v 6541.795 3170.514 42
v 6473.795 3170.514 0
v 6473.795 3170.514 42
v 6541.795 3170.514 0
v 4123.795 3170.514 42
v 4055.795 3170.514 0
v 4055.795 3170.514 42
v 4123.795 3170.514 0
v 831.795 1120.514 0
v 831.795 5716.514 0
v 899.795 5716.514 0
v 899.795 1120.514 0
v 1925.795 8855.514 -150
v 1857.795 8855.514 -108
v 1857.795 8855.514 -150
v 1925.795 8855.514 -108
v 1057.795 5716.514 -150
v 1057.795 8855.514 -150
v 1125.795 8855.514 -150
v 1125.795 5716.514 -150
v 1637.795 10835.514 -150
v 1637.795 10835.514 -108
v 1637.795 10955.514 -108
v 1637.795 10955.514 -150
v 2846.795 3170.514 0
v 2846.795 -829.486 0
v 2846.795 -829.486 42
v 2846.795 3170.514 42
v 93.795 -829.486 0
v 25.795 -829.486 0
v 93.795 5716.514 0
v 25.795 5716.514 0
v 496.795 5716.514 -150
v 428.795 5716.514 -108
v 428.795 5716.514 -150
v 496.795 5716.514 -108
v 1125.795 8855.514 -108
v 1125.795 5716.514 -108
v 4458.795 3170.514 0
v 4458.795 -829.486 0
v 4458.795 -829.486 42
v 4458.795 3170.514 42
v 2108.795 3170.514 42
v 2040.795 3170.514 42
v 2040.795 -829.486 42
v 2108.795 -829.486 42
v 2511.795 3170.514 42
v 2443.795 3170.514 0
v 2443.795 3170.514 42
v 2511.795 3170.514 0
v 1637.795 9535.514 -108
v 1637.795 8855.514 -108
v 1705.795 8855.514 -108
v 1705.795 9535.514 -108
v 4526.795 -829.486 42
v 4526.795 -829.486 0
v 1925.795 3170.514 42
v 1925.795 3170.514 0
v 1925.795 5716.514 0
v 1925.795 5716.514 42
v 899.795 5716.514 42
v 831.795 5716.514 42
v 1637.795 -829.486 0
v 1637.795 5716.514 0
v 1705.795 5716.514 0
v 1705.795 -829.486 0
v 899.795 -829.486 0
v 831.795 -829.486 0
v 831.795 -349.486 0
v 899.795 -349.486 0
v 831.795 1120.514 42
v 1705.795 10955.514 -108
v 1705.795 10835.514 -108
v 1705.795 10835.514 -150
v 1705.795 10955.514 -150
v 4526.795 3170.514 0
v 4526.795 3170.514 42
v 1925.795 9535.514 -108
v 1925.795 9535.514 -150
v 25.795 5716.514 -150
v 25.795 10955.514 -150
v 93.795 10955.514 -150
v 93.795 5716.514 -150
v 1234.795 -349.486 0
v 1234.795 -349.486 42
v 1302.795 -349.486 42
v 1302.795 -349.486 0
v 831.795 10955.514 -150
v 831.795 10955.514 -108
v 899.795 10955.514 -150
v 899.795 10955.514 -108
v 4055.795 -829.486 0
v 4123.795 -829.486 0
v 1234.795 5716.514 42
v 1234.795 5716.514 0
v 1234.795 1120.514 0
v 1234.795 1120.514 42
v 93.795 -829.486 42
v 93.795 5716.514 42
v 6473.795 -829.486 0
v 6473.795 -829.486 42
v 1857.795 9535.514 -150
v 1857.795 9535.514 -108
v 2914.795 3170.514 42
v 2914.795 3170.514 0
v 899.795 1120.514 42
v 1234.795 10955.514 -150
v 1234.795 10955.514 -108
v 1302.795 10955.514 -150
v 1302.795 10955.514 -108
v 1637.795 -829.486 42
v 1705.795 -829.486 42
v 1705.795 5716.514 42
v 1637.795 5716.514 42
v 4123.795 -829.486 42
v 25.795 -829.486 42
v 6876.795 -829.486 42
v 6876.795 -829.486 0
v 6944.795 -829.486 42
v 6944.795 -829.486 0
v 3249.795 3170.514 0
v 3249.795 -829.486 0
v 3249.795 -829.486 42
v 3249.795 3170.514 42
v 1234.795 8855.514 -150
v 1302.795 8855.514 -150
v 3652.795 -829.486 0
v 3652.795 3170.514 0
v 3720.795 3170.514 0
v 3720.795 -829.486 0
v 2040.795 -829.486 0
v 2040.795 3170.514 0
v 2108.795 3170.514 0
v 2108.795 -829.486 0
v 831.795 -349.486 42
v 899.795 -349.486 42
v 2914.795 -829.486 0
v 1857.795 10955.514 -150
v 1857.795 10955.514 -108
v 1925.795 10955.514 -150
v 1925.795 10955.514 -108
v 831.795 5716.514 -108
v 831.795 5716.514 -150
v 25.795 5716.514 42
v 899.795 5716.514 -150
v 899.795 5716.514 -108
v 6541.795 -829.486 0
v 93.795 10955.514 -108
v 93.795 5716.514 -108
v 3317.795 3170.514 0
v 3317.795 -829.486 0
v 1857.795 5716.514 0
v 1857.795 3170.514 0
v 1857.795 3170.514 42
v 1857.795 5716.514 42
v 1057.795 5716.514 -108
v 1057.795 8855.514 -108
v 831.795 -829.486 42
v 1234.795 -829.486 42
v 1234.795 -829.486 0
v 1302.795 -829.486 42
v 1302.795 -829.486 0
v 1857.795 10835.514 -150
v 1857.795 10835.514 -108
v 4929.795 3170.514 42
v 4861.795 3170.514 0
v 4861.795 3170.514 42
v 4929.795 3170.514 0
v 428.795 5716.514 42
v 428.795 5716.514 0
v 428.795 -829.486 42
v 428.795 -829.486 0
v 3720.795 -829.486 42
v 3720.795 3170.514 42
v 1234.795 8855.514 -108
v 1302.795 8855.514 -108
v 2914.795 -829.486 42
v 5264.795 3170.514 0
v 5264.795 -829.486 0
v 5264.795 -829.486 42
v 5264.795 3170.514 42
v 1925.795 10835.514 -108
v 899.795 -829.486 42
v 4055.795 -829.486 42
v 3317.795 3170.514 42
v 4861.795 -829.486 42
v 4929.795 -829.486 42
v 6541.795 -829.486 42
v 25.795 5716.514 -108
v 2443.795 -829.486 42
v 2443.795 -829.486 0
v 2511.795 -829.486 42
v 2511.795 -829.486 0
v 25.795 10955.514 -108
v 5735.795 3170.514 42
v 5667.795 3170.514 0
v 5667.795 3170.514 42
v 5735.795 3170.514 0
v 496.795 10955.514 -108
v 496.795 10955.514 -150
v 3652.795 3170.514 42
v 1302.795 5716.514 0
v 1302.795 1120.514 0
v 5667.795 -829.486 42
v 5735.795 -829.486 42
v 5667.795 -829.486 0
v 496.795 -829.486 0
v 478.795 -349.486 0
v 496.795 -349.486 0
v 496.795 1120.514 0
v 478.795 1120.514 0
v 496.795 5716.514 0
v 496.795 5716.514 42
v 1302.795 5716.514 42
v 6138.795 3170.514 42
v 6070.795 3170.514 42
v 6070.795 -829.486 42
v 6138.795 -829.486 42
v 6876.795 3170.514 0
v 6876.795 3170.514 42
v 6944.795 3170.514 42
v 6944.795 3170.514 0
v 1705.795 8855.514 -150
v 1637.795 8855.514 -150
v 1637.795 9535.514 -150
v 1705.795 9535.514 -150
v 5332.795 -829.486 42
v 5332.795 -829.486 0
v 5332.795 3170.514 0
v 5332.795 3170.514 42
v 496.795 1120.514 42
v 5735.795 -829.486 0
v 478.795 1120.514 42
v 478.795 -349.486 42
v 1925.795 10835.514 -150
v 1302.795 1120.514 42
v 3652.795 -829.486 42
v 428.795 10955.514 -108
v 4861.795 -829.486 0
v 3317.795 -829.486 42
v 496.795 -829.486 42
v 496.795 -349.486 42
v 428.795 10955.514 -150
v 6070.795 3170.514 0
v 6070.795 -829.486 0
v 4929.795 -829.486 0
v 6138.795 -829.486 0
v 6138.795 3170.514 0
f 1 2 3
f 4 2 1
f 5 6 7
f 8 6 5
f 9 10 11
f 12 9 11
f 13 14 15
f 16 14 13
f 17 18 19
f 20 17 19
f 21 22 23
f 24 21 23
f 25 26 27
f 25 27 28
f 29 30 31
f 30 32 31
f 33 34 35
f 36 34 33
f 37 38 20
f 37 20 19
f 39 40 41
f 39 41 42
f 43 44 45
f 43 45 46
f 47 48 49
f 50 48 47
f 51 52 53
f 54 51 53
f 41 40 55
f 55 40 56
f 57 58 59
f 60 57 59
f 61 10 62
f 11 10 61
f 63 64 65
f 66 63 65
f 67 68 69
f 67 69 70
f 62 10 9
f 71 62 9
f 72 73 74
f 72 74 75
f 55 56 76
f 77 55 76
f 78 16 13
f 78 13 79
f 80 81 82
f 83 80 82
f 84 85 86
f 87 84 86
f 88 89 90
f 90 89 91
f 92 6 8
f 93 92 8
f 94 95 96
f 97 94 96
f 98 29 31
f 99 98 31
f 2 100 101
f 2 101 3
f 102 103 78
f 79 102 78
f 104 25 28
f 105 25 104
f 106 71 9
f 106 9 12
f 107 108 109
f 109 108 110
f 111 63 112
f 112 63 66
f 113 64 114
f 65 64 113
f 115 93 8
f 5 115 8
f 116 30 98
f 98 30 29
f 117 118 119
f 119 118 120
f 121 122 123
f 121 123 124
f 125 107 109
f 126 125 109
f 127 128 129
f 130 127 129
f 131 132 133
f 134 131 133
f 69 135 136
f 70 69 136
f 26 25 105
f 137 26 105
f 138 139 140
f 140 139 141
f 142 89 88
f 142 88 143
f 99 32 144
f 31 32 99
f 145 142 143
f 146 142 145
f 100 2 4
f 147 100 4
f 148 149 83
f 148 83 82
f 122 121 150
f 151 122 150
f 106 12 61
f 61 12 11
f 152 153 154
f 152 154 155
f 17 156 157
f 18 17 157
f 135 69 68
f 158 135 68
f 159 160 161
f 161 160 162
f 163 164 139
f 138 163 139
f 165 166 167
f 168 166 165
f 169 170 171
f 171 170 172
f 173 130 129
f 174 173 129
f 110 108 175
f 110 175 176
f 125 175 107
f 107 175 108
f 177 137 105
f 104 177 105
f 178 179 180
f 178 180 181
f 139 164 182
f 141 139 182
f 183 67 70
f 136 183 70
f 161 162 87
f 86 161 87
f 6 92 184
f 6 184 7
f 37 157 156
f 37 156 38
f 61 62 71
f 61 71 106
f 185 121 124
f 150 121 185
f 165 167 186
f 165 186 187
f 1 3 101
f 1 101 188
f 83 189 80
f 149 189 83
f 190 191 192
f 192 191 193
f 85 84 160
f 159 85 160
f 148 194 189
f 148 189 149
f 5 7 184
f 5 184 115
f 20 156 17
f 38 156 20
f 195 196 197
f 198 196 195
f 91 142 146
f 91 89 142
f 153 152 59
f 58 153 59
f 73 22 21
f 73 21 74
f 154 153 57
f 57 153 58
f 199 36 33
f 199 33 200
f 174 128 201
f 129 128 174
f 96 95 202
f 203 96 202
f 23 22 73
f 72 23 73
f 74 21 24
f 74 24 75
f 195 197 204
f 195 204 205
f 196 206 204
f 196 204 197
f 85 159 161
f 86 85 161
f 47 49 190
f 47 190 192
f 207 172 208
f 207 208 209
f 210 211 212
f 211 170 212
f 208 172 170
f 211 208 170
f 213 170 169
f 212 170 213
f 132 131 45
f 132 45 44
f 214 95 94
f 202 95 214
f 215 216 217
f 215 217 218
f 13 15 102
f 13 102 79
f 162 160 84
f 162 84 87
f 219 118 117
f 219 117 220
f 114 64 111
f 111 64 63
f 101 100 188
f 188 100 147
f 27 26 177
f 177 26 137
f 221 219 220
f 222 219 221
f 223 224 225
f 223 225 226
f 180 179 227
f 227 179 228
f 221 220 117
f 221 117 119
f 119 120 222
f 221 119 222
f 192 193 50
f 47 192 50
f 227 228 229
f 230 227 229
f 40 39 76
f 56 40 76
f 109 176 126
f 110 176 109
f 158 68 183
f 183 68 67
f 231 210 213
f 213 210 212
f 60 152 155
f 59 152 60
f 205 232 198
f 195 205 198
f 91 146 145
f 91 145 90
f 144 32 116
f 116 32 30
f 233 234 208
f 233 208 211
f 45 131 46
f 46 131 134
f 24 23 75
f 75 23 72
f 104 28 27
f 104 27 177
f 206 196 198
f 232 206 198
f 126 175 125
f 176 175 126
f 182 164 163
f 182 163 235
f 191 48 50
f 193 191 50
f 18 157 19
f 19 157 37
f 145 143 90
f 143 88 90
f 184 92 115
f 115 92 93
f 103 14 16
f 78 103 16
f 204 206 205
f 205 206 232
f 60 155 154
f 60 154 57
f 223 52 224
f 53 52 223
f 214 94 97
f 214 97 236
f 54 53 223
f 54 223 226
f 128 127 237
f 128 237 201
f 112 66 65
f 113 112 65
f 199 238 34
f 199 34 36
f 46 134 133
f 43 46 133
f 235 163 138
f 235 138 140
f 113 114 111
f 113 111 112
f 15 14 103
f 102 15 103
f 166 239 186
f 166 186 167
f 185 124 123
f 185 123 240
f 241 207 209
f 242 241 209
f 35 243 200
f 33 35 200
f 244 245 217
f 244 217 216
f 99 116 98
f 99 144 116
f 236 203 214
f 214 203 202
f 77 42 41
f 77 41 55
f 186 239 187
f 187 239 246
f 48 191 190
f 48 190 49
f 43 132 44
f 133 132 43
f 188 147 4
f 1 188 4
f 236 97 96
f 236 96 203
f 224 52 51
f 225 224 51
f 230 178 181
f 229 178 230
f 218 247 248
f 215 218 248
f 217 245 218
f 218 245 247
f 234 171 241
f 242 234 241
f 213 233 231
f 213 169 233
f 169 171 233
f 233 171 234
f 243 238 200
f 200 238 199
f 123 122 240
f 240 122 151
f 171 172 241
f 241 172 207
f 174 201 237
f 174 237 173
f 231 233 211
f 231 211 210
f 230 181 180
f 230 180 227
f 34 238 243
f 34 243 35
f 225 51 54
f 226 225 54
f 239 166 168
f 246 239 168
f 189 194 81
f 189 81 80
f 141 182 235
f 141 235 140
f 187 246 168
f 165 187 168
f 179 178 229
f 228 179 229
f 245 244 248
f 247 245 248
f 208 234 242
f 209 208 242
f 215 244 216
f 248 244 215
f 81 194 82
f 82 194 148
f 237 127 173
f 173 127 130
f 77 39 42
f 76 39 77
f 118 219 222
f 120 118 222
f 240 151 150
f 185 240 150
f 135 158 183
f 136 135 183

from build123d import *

# Parameters (mm, degrees)
F0_W     = 68
F0_H     = 4000
F0_H_2   = 2546
F1_DEPTH = 42
F2_START = -108
F0_H_3   = 2100
F2_DEPTH = 42
F0_H_4   = 3139
F3_W     = 600
F3_H     = 1300
F3_W_2   = 1000
F3_H_2   = 1470
F4_DEPTH = 1000


with BuildPart() as f1:
    # F0 (on Top) → F1 (new body)
    with BuildSketch(Plane.XY):
        with Locations((59.794658795, 1170.5140980401)):
            Rectangle(F0_W, F0_H)
        with Locations((59.794658795, 4443.5140980401)):
            Rectangle(F0_W, F0_H_2)
    extrude(amount=F1_DEPTH)


with BuildPart() as f1b:
    # F0 (on Top) → F1, piece 2 (new body)
    with BuildSketch(Plane.XY):
        with Locations((462.794658795, 1170.5140980401)):
            Rectangle(F0_W, F0_H)
        with Locations((462.794658795, 4443.5140980401)):
            Rectangle(F0_W, F0_H_2)
    extrude(amount=F1_DEPTH)


with BuildPart() as f1c:
    # F0 (on Top) → F1, piece 3 (new body)
    with BuildSketch(Plane.XY):
        with Locations((865.794658795, 1170.5140980401)):
            Rectangle(F0_W, F0_H)
        with Locations((865.794658795, 4443.5140980401)):
            Rectangle(F0_W, F0_H_2)
    extrude(amount=F1_DEPTH)


with BuildPart() as f1d:
    # F0 (on Top) → F1, piece 4 (new body)
    with BuildSketch(Plane.XY):
        with Locations((1268.794658795, 1170.5140980401)):
            Rectangle(F0_W, F0_H)
        with Locations((1268.794658795, 4443.5140980401)):
            Rectangle(F0_W, F0_H_2)
    extrude(amount=F1_DEPTH)


with BuildPart() as f1e:
    # F0 (on Top) → F1, piece 5 (new body)
    with BuildSketch(Plane.XY):
        with Locations((2477.794658795, 1170.5140980401)):
            Rectangle(F0_W, F0_H)
    extrude(amount=F1_DEPTH)


with BuildPart() as f1f:
    # F0 (on Top) → F1, piece 6 (new body)
    with BuildSketch(Plane.XY):
        with Locations((4089.794658795, 1170.5140980401)):
            Rectangle(F0_W, F0_H)
    extrude(amount=F1_DEPTH)


with BuildPart() as f1g:
    # F0 (on Top) → F1, piece 7 (new body)
    with BuildSketch(Plane.XY):
        with Locations((2880.794658795, 1170.5140980401)):
            Rectangle(F0_W, F0_H)
    extrude(amount=F1_DEPTH)


with BuildPart() as f1h:
    # F0 (on Top) → F1, piece 8 (new body)
    with BuildSketch(Plane.XY):
        with Locations((1671.794658795, 4443.5140980401)):
            Rectangle(F0_W, F0_H_2)
        with Locations((1671.794658795, 1170.5140980401)):
            Rectangle(F0_W, F0_H)
    extrude(amount=F1_DEPTH)


with BuildPart() as f1i:
    # F0 (on Top) → F1, piece 9 (new body)
    with BuildSketch(Plane.XY):
        with Locations((2074.794658795, 1170.5140980401)):
            Rectangle(F0_W, F0_H)
    extrude(amount=F1_DEPTH)


with BuildPart() as f1j:
    # F0 (on Top) → F1, piece 10 (new body)
    with BuildSketch(Plane.XY):
        with Locations((5298.794658795, 1170.5140980401)):
            Rectangle(F0_W, F0_H)
    extrude(amount=F1_DEPTH)


with BuildPart() as f1k:
    # F0 (on Top) → F1, piece 11 (new body)
    with BuildSketch(Plane.XY):
        with Locations((5701.794658795, 1170.5140980401)):
            Rectangle(F0_W, F0_H)
    extrude(amount=F1_DEPTH)


with BuildPart() as f1l:
    # F0 (on Top) → F1, piece 12 (new body)
    with BuildSketch(Plane.XY):
        with Locations((4492.794658795, 1170.5140980401)):
            Rectangle(F0_W, F0_H)
    extrude(amount=F1_DEPTH)


with BuildPart() as f1m:
    # F0 (on Top) → F1, piece 13 (new body)
    with BuildSketch(Plane.XY):
        with Locations((3283.794658795, 1170.5140980401)):
            Rectangle(F0_W, F0_H)
    extrude(amount=F1_DEPTH)


with BuildPart() as f1n:
    # F0 (on Top) → F1, piece 14 (new body)
    with BuildSketch(Plane.XY):
        with Locations((4895.794658795, 1170.5140980401)):
            Rectangle(F0_W, F0_H)
    extrude(amount=F1_DEPTH)


with BuildPart() as f1o:
    # F0 (on Top) → F1, piece 15 (new body)
    with BuildSketch(Plane.XY):
        with Locations((3686.794658795, 1170.5140980401)):
            Rectangle(F0_W, F0_H)
    extrude(amount=F1_DEPTH)


with BuildPart() as f1p:
    # F0 (on Top) → F1, piece 16 (new body)
    with BuildSketch(Plane.XY):
        with Locations((6910.794658795, 1170.5140980401)):
            Rectangle(F0_W, F0_H)
    extrude(amount=F1_DEPTH)


with BuildPart() as f1q:
    # F0 (on Top) → F1, piece 17 (new body)
    with BuildSketch(Plane.XY):
        with Locations((1891.794658795, 4443.5140980401)):
            Rectangle(F0_W, F0_H_2)
    extrude(amount=F1_DEPTH)


with BuildPart() as f1r:
    # F0 (on Top) → F1, piece 18 (new body)
    with BuildSketch(Plane.XY):
        with Locations((6507.794658795, 1170.5140980401)):
            Rectangle(F0_W, F0_H)
    extrude(amount=F1_DEPTH)


with BuildPart() as f1s:
    # F0 (on Top) → F1, piece 19 (new body)
    with BuildSketch(Plane.XY):
        with Locations((6104.794658795, 1170.5140980401)):
            Rectangle(F0_W, F0_H)
    extrude(amount=F1_DEPTH)


with BuildPart() as f2:
    # F0 (on Top) → F2 (new body)
    with BuildSketch(Plane.XY.offset(F2_START)):
        with Locations((1671.794658795, 9905.5140980401)):
            Rectangle(F0_W, F0_H_3)
    extrude(amount=-F2_DEPTH)


with BuildPart() as f2b:
    # F0 (on Top) → F2, piece 2 (new body)
    with BuildSketch(Plane.XY.offset(F2_START)):
        with Locations((1268.794658795, 9905.5140980401)):
            Rectangle(F0_W, F0_H_3)
    extrude(amount=-F2_DEPTH)


with BuildPart() as f2c:
    # F0 (on Top) → F2, piece 3 (new body)
    with BuildSketch(Plane.XY.offset(F2_START)):
        with Locations((865.794658795, 7286.0140980401)):
            Rectangle(F0_W, F0_H_4)
        with Locations((865.794658795, 9905.5140980401)):
            Rectangle(F0_W, F0_H_3)
    extrude(amount=-F2_DEPTH)


with BuildPart() as f2d:
    # F0 (on Top) → F2, piece 4 (new body)
    with BuildSketch(Plane.XY.offset(F2_START)):
        with Locations((1091.794658795, 7286.0140980401)):
            Rectangle(F0_W, F0_H_4)
    extrude(amount=-F2_DEPTH)


with BuildPart() as f2e:
    # F0 (on Top) → F2, piece 5 (new body)
    with BuildSketch(Plane.XY.offset(F2_START)):
        with Locations((462.794658795, 9905.5140980401)):
            Rectangle(F0_W, F0_H_3)
        with Locations((462.794658795, 7286.0140980401)):
            Rectangle(F0_W, F0_H_4)
    extrude(amount=-F2_DEPTH)


with BuildPart() as f2f:
    # F0 (on Top) → F2, piece 6 (new body)
    with BuildSketch(Plane.XY.offset(F2_START)):
        with Locations((59.794658795, 9905.5140980401)):
            Rectangle(F0_W, F0_H_3)
        with Locations((59.794658795, 7286.0140980401)):
            Rectangle(F0_W, F0_H_4)
    extrude(amount=-F2_DEPTH)


with BuildPart() as f2g:
    # F0 (on Top) → F2, piece 7 (new body)
    with BuildSketch(Plane.XY.offset(F2_START)):
        with Locations((1891.794658795, 9905.5140980401)):
            Rectangle(F0_W, F0_H_3)
    extrude(amount=-F2_DEPTH)


with BuildPart() as f4_tool:
    # F3 (on face) → F4 (new body)
    with BuildSketch(Plane.XY.offset(42)):
        with Locations((1625.794658795, 10185.5140980401)):
            Rectangle(F3_W, F3_H)
        with Locations((978.794658795, 385.5140980401)):
            Rectangle(F3_W_2, F3_H_2)
    extrude(amount=-F4_DEPTH)


with BuildPart() as f1b_1:
    add(f1b.part)

    # F4: cut by f4_tool
    add(f4_tool.part, mode=Mode.SUBTRACT)


with BuildPart() as f1c_1:
    add(f1c.part)

    # F4: cut by f4_tool
    add(f4_tool.part, mode=Mode.SUBTRACT)


with BuildPart() as f1d_1:
    add(f1d.part)

    # F4: cut by f4_tool
    add(f4_tool.part, mode=Mode.SUBTRACT)


with BuildPart() as f2_1:
    add(f2.part)

    # F4: cut by f4_tool
    add(f4_tool.part, mode=Mode.SUBTRACT)


with BuildPart() as f2g_1:
    add(f2g.part)

    # F4: cut by f4_tool
    add(f4_tool.part, mode=Mode.SUBTRACT)


solid = Compound([f1.part, f1e.part, f1f.part, f1g.part, f1h.part, f1i.part, f1j.part, f1k.part, f1l.part, f1m.part, f1n.part, f1o.part, f1p.part, f1q.part, f1r.part, f1s.part, f2b.part, f2c.part, f2d.part, f2e.part, f2f.part, f1b_1.part, f1c_1.part, f1d_1.part, f2_1.part, f2g_1.part])
